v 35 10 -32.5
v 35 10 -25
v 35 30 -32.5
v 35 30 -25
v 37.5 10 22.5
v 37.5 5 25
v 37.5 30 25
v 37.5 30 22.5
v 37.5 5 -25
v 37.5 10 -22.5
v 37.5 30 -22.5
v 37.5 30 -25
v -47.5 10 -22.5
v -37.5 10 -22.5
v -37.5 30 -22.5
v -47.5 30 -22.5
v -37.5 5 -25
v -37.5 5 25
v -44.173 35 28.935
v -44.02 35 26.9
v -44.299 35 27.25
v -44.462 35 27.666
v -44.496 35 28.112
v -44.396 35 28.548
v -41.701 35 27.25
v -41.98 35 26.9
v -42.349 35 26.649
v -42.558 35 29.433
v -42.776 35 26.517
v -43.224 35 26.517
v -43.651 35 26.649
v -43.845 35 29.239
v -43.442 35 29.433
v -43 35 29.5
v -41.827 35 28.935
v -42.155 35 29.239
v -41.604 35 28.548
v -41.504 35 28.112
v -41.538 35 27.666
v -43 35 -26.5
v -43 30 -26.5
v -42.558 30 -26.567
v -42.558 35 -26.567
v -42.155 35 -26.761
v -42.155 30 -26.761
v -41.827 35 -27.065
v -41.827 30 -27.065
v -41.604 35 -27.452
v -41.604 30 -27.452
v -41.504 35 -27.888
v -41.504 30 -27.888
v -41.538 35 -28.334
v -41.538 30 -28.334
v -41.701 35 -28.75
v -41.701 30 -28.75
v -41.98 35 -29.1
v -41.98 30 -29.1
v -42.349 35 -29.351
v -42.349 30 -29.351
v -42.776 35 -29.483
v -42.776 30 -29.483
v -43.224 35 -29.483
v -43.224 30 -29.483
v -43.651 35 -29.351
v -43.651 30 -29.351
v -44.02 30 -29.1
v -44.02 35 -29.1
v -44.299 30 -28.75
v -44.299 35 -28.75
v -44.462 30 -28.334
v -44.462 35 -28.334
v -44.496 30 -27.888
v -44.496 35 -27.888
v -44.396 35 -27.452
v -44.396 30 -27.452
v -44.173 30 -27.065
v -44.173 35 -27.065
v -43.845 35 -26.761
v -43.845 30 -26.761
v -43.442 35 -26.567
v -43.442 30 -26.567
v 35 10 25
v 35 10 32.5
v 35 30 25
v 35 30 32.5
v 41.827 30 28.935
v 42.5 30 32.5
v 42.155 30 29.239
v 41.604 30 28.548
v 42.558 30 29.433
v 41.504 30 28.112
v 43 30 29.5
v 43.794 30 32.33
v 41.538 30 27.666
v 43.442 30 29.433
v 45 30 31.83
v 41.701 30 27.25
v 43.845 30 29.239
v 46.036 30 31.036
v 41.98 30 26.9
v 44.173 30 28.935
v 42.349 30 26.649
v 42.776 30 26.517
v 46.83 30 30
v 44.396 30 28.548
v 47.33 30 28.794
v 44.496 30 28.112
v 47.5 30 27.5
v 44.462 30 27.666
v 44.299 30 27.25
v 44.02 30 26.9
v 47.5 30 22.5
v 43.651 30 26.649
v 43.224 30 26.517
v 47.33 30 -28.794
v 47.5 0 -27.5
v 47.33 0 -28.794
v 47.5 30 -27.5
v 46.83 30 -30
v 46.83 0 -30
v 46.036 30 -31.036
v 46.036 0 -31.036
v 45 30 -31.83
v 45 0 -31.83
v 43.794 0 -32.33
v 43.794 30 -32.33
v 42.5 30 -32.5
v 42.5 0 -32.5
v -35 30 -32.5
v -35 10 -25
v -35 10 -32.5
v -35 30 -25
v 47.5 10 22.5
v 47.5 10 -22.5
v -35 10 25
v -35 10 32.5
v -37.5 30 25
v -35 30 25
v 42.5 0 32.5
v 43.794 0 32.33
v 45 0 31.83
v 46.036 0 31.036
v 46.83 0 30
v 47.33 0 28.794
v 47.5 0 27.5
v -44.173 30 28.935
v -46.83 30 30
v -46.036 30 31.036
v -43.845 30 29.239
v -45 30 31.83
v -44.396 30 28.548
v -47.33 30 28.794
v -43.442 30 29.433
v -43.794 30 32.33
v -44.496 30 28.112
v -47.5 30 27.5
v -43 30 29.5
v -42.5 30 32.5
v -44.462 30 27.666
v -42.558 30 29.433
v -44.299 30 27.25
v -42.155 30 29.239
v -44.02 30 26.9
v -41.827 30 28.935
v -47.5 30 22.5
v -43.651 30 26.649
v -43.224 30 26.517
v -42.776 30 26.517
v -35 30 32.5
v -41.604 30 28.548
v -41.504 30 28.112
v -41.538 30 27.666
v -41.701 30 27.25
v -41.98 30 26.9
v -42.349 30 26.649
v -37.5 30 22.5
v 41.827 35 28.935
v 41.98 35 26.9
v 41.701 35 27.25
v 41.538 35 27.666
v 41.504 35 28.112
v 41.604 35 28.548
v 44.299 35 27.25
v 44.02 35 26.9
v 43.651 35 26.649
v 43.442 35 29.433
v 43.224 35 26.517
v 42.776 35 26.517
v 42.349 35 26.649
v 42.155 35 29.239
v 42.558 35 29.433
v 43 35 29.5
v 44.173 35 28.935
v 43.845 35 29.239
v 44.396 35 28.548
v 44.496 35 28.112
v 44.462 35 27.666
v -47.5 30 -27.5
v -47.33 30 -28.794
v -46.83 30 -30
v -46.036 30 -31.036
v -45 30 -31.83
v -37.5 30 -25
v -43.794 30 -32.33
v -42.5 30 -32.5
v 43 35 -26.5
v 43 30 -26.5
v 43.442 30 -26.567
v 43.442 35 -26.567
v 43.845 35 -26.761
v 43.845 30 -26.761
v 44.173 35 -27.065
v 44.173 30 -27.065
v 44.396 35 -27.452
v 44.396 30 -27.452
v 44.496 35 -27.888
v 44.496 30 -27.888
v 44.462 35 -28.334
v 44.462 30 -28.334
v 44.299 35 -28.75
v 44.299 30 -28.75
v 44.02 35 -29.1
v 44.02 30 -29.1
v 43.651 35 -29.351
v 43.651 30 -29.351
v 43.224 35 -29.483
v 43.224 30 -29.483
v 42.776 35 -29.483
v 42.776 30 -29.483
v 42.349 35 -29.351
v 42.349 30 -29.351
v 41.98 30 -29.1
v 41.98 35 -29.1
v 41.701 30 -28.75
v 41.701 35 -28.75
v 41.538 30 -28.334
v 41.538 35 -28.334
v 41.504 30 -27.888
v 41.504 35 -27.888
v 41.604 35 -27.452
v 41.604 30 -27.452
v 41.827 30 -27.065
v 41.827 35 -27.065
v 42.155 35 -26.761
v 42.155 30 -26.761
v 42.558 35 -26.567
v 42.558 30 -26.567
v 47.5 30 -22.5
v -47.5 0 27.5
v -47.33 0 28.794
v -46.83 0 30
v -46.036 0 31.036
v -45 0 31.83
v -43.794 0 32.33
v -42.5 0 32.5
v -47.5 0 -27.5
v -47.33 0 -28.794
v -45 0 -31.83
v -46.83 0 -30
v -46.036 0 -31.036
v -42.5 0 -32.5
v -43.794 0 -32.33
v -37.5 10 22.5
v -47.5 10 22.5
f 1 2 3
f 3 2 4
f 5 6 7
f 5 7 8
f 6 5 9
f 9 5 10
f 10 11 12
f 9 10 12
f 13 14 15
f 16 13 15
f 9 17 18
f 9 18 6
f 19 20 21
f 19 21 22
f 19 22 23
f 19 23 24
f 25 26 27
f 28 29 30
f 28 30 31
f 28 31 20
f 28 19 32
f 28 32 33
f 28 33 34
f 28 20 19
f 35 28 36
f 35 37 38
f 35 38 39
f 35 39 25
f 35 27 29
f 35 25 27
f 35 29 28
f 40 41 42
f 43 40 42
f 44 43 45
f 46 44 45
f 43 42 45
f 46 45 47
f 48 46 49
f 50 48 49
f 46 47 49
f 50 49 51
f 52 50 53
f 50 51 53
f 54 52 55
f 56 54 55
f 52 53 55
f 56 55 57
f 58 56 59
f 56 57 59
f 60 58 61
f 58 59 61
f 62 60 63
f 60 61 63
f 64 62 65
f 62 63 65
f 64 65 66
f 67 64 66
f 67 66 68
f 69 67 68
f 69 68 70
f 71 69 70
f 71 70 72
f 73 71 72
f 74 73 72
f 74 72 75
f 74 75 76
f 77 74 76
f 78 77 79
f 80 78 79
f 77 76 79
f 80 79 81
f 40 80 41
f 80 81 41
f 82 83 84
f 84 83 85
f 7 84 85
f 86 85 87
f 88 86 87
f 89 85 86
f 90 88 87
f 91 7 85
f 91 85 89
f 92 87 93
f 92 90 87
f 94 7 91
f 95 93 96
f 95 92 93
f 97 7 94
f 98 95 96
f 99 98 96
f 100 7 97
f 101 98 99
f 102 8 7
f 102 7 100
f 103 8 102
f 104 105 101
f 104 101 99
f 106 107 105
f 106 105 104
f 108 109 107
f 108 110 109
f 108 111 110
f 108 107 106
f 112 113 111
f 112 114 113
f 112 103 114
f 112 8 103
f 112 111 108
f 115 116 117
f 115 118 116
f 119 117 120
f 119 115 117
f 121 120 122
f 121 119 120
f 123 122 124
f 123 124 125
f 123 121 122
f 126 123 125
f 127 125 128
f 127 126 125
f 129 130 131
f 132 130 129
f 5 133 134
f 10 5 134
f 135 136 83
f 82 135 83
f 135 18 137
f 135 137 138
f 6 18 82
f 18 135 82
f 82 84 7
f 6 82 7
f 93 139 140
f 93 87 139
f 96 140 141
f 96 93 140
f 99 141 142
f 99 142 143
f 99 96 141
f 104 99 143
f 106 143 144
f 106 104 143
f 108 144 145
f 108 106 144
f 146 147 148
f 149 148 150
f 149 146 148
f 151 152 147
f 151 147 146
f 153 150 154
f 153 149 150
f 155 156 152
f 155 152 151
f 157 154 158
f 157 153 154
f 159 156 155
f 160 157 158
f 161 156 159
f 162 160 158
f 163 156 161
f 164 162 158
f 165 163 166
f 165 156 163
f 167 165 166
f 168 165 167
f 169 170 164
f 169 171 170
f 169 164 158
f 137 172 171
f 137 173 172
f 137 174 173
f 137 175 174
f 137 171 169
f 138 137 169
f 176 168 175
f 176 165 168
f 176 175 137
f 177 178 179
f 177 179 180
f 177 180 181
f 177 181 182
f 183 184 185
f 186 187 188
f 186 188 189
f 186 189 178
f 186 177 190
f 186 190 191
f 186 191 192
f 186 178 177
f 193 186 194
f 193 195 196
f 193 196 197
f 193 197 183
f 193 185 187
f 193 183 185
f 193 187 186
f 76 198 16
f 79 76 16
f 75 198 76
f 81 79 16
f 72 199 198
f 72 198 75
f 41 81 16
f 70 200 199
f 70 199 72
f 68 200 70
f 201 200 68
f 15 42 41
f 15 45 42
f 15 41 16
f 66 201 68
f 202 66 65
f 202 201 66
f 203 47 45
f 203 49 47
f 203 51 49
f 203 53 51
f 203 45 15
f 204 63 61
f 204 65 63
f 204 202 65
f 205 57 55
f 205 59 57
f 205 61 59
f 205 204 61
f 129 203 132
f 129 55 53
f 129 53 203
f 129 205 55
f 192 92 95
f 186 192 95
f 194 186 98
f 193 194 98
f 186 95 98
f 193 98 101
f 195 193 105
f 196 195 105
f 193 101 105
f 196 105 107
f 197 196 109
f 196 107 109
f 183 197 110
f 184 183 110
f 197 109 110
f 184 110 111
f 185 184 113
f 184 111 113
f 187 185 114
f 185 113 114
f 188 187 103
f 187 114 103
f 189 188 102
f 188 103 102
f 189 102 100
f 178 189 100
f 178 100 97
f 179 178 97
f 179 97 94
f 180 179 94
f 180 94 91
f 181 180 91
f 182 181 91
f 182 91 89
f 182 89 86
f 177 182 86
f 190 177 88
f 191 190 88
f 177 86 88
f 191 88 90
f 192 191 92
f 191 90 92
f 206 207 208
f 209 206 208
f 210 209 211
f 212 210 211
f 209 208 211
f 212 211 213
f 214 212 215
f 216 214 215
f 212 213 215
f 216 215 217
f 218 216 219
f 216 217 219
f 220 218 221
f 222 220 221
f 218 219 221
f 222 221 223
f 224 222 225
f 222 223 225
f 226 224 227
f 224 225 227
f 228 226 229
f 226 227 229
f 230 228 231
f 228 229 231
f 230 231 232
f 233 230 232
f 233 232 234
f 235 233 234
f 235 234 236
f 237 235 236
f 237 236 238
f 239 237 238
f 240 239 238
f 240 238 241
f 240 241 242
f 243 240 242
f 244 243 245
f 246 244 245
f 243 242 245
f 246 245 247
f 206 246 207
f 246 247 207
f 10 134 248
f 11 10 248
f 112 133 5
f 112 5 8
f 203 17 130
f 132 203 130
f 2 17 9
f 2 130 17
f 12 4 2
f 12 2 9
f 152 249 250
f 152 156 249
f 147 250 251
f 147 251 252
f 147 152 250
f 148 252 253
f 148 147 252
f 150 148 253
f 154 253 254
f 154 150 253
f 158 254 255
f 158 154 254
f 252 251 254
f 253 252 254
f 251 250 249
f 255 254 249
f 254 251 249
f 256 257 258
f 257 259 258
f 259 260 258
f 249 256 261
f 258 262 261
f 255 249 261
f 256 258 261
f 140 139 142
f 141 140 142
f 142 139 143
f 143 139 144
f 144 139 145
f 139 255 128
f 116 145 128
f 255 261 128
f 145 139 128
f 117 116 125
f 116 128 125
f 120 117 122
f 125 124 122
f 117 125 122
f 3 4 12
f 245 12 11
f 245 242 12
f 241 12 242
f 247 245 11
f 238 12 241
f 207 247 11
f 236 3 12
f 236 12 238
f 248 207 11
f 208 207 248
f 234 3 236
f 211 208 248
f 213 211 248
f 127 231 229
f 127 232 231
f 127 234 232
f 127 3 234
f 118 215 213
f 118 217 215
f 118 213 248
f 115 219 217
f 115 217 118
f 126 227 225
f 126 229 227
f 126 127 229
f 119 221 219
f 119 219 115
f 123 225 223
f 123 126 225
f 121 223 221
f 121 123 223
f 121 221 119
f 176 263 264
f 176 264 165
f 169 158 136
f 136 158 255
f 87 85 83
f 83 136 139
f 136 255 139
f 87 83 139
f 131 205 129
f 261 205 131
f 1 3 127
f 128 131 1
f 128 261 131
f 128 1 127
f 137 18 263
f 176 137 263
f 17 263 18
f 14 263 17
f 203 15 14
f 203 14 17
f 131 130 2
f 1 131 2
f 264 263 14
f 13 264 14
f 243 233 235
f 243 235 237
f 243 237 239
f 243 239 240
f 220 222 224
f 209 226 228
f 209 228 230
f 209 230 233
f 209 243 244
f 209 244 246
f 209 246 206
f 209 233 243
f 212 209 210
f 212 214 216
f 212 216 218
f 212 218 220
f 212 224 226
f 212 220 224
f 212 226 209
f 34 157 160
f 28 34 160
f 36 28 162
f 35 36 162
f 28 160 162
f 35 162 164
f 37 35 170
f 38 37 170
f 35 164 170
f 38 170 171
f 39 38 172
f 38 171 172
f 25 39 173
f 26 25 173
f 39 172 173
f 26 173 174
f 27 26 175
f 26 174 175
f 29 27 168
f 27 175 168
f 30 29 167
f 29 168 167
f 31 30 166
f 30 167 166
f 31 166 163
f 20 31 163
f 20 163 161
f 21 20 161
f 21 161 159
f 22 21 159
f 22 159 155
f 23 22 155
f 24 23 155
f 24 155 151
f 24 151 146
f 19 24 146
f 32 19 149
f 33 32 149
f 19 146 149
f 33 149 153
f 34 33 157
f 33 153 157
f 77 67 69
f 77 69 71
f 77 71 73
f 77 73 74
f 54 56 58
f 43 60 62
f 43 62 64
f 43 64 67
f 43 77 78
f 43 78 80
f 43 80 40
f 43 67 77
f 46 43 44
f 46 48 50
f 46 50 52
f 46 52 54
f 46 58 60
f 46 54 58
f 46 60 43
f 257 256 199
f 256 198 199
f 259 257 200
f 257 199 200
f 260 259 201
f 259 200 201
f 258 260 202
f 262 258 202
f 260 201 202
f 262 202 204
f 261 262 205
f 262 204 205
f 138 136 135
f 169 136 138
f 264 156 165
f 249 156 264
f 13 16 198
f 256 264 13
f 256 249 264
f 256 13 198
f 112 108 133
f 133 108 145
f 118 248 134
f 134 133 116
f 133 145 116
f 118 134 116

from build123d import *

# Parameters (mm, degrees)
SKETCH1_W           = 95
SKETCH1_H           = 65
BOSS_EXTRUDE1_DEPTH = 30
FILLET1_R           = 5
SKETCH2_W           = 75
SKETCH2_H           = 50
CUT_EXTRUDE1_DEPTH  = 25
SKETCH3_R           = 1.5
BOSS_EXTRUDE2_DEPTH = 5
SKETCH4_W           = 45
SKETCH4_H           = 40
CUT_EXTRUDE2_DEPTH  = 107.330851591
SKETCH5_W           = 70
SKETCH5_H           = 40
CUT_EXTRUDE3_DEPTH  = 88.78524933


with BuildPart() as part:
    # Sketch1 → Boss-Extrude1 (new body)
    with BuildSketch(Plane(origin=(0, 0, 0), x_dir=(1, 0, 0), z_dir=(0, 1, 0))):
        Rectangle(SKETCH1_W, SKETCH1_H)
    extrude(amount=BOSS_EXTRUDE1_DEPTH)

    # Fillet1
    fillet1_edges = [part.edges().sort_by_distance(p)[0] for p in [
        (47.5, 15, 32.5),
        (-47.5, 15, 32.5),
        (-47.5, 15, -32.5),
        (47.5, 15, -32.5),
    ]]
    fillet(fillet1_edges, radius=FILLET1_R)

    # Sketch2 → Cut-Extrude1 (cut)
    with BuildSketch(Plane(origin=(0, 30, 0), x_dir=(1, 0, 0), z_dir=(0, 1, 0))):
        Rectangle(SKETCH2_W, SKETCH2_H)
    extrude(amount=-CUT_EXTRUDE1_DEPTH, mode=Mode.SUBTRACT)

    # Sketch3 → Boss-Extrude2 (add)
    with BuildSketch(Plane(origin=(0, 30, 0), x_dir=(1, 0, 0), z_dir=(0, 1, 0))):
        with Locations(Location((43, 28, 0), (0, 0, 270))):
            Circle(SKETCH3_R)
        with Locations(Location((-43, 28, 0), (0, 0, 270))):
            Circle(SKETCH3_R)
        with Locations(Location((43, -28, 0), (0, 0, 270))):
            Circle(SKETCH3_R)
        with Locations(Location((-43, -28, 0), (0, 0, 270))):
            Circle(SKETCH3_R)
    extrude(amount=BOSS_EXTRUDE2_DEPTH)

    # Sketch4 → Cut-Extrude2 (cut, through all)
    with BuildSketch(Plane(origin=(47.5, 0, 0), x_dir=(0, 0, -1), z_dir=(1, 0, 0))):
        with Locations((0, 30)):
            Rectangle(SKETCH4_W, SKETCH4_H)
    extrude(amount=-CUT_EXTRUDE2_DEPTH, mode=Mode.SUBTRACT)

    # Sketch5 → Cut-Extrude3 (cut, through all)
    with BuildSketch(Plane.XY.offset(32.5)):
        with Locations((0, 30)):
            Rectangle(SKETCH5_W, SKETCH5_H)
    extrude(amount=-CUT_EXTRUDE3_DEPTH, mode=Mode.SUBTRACT)


solid = part.part
